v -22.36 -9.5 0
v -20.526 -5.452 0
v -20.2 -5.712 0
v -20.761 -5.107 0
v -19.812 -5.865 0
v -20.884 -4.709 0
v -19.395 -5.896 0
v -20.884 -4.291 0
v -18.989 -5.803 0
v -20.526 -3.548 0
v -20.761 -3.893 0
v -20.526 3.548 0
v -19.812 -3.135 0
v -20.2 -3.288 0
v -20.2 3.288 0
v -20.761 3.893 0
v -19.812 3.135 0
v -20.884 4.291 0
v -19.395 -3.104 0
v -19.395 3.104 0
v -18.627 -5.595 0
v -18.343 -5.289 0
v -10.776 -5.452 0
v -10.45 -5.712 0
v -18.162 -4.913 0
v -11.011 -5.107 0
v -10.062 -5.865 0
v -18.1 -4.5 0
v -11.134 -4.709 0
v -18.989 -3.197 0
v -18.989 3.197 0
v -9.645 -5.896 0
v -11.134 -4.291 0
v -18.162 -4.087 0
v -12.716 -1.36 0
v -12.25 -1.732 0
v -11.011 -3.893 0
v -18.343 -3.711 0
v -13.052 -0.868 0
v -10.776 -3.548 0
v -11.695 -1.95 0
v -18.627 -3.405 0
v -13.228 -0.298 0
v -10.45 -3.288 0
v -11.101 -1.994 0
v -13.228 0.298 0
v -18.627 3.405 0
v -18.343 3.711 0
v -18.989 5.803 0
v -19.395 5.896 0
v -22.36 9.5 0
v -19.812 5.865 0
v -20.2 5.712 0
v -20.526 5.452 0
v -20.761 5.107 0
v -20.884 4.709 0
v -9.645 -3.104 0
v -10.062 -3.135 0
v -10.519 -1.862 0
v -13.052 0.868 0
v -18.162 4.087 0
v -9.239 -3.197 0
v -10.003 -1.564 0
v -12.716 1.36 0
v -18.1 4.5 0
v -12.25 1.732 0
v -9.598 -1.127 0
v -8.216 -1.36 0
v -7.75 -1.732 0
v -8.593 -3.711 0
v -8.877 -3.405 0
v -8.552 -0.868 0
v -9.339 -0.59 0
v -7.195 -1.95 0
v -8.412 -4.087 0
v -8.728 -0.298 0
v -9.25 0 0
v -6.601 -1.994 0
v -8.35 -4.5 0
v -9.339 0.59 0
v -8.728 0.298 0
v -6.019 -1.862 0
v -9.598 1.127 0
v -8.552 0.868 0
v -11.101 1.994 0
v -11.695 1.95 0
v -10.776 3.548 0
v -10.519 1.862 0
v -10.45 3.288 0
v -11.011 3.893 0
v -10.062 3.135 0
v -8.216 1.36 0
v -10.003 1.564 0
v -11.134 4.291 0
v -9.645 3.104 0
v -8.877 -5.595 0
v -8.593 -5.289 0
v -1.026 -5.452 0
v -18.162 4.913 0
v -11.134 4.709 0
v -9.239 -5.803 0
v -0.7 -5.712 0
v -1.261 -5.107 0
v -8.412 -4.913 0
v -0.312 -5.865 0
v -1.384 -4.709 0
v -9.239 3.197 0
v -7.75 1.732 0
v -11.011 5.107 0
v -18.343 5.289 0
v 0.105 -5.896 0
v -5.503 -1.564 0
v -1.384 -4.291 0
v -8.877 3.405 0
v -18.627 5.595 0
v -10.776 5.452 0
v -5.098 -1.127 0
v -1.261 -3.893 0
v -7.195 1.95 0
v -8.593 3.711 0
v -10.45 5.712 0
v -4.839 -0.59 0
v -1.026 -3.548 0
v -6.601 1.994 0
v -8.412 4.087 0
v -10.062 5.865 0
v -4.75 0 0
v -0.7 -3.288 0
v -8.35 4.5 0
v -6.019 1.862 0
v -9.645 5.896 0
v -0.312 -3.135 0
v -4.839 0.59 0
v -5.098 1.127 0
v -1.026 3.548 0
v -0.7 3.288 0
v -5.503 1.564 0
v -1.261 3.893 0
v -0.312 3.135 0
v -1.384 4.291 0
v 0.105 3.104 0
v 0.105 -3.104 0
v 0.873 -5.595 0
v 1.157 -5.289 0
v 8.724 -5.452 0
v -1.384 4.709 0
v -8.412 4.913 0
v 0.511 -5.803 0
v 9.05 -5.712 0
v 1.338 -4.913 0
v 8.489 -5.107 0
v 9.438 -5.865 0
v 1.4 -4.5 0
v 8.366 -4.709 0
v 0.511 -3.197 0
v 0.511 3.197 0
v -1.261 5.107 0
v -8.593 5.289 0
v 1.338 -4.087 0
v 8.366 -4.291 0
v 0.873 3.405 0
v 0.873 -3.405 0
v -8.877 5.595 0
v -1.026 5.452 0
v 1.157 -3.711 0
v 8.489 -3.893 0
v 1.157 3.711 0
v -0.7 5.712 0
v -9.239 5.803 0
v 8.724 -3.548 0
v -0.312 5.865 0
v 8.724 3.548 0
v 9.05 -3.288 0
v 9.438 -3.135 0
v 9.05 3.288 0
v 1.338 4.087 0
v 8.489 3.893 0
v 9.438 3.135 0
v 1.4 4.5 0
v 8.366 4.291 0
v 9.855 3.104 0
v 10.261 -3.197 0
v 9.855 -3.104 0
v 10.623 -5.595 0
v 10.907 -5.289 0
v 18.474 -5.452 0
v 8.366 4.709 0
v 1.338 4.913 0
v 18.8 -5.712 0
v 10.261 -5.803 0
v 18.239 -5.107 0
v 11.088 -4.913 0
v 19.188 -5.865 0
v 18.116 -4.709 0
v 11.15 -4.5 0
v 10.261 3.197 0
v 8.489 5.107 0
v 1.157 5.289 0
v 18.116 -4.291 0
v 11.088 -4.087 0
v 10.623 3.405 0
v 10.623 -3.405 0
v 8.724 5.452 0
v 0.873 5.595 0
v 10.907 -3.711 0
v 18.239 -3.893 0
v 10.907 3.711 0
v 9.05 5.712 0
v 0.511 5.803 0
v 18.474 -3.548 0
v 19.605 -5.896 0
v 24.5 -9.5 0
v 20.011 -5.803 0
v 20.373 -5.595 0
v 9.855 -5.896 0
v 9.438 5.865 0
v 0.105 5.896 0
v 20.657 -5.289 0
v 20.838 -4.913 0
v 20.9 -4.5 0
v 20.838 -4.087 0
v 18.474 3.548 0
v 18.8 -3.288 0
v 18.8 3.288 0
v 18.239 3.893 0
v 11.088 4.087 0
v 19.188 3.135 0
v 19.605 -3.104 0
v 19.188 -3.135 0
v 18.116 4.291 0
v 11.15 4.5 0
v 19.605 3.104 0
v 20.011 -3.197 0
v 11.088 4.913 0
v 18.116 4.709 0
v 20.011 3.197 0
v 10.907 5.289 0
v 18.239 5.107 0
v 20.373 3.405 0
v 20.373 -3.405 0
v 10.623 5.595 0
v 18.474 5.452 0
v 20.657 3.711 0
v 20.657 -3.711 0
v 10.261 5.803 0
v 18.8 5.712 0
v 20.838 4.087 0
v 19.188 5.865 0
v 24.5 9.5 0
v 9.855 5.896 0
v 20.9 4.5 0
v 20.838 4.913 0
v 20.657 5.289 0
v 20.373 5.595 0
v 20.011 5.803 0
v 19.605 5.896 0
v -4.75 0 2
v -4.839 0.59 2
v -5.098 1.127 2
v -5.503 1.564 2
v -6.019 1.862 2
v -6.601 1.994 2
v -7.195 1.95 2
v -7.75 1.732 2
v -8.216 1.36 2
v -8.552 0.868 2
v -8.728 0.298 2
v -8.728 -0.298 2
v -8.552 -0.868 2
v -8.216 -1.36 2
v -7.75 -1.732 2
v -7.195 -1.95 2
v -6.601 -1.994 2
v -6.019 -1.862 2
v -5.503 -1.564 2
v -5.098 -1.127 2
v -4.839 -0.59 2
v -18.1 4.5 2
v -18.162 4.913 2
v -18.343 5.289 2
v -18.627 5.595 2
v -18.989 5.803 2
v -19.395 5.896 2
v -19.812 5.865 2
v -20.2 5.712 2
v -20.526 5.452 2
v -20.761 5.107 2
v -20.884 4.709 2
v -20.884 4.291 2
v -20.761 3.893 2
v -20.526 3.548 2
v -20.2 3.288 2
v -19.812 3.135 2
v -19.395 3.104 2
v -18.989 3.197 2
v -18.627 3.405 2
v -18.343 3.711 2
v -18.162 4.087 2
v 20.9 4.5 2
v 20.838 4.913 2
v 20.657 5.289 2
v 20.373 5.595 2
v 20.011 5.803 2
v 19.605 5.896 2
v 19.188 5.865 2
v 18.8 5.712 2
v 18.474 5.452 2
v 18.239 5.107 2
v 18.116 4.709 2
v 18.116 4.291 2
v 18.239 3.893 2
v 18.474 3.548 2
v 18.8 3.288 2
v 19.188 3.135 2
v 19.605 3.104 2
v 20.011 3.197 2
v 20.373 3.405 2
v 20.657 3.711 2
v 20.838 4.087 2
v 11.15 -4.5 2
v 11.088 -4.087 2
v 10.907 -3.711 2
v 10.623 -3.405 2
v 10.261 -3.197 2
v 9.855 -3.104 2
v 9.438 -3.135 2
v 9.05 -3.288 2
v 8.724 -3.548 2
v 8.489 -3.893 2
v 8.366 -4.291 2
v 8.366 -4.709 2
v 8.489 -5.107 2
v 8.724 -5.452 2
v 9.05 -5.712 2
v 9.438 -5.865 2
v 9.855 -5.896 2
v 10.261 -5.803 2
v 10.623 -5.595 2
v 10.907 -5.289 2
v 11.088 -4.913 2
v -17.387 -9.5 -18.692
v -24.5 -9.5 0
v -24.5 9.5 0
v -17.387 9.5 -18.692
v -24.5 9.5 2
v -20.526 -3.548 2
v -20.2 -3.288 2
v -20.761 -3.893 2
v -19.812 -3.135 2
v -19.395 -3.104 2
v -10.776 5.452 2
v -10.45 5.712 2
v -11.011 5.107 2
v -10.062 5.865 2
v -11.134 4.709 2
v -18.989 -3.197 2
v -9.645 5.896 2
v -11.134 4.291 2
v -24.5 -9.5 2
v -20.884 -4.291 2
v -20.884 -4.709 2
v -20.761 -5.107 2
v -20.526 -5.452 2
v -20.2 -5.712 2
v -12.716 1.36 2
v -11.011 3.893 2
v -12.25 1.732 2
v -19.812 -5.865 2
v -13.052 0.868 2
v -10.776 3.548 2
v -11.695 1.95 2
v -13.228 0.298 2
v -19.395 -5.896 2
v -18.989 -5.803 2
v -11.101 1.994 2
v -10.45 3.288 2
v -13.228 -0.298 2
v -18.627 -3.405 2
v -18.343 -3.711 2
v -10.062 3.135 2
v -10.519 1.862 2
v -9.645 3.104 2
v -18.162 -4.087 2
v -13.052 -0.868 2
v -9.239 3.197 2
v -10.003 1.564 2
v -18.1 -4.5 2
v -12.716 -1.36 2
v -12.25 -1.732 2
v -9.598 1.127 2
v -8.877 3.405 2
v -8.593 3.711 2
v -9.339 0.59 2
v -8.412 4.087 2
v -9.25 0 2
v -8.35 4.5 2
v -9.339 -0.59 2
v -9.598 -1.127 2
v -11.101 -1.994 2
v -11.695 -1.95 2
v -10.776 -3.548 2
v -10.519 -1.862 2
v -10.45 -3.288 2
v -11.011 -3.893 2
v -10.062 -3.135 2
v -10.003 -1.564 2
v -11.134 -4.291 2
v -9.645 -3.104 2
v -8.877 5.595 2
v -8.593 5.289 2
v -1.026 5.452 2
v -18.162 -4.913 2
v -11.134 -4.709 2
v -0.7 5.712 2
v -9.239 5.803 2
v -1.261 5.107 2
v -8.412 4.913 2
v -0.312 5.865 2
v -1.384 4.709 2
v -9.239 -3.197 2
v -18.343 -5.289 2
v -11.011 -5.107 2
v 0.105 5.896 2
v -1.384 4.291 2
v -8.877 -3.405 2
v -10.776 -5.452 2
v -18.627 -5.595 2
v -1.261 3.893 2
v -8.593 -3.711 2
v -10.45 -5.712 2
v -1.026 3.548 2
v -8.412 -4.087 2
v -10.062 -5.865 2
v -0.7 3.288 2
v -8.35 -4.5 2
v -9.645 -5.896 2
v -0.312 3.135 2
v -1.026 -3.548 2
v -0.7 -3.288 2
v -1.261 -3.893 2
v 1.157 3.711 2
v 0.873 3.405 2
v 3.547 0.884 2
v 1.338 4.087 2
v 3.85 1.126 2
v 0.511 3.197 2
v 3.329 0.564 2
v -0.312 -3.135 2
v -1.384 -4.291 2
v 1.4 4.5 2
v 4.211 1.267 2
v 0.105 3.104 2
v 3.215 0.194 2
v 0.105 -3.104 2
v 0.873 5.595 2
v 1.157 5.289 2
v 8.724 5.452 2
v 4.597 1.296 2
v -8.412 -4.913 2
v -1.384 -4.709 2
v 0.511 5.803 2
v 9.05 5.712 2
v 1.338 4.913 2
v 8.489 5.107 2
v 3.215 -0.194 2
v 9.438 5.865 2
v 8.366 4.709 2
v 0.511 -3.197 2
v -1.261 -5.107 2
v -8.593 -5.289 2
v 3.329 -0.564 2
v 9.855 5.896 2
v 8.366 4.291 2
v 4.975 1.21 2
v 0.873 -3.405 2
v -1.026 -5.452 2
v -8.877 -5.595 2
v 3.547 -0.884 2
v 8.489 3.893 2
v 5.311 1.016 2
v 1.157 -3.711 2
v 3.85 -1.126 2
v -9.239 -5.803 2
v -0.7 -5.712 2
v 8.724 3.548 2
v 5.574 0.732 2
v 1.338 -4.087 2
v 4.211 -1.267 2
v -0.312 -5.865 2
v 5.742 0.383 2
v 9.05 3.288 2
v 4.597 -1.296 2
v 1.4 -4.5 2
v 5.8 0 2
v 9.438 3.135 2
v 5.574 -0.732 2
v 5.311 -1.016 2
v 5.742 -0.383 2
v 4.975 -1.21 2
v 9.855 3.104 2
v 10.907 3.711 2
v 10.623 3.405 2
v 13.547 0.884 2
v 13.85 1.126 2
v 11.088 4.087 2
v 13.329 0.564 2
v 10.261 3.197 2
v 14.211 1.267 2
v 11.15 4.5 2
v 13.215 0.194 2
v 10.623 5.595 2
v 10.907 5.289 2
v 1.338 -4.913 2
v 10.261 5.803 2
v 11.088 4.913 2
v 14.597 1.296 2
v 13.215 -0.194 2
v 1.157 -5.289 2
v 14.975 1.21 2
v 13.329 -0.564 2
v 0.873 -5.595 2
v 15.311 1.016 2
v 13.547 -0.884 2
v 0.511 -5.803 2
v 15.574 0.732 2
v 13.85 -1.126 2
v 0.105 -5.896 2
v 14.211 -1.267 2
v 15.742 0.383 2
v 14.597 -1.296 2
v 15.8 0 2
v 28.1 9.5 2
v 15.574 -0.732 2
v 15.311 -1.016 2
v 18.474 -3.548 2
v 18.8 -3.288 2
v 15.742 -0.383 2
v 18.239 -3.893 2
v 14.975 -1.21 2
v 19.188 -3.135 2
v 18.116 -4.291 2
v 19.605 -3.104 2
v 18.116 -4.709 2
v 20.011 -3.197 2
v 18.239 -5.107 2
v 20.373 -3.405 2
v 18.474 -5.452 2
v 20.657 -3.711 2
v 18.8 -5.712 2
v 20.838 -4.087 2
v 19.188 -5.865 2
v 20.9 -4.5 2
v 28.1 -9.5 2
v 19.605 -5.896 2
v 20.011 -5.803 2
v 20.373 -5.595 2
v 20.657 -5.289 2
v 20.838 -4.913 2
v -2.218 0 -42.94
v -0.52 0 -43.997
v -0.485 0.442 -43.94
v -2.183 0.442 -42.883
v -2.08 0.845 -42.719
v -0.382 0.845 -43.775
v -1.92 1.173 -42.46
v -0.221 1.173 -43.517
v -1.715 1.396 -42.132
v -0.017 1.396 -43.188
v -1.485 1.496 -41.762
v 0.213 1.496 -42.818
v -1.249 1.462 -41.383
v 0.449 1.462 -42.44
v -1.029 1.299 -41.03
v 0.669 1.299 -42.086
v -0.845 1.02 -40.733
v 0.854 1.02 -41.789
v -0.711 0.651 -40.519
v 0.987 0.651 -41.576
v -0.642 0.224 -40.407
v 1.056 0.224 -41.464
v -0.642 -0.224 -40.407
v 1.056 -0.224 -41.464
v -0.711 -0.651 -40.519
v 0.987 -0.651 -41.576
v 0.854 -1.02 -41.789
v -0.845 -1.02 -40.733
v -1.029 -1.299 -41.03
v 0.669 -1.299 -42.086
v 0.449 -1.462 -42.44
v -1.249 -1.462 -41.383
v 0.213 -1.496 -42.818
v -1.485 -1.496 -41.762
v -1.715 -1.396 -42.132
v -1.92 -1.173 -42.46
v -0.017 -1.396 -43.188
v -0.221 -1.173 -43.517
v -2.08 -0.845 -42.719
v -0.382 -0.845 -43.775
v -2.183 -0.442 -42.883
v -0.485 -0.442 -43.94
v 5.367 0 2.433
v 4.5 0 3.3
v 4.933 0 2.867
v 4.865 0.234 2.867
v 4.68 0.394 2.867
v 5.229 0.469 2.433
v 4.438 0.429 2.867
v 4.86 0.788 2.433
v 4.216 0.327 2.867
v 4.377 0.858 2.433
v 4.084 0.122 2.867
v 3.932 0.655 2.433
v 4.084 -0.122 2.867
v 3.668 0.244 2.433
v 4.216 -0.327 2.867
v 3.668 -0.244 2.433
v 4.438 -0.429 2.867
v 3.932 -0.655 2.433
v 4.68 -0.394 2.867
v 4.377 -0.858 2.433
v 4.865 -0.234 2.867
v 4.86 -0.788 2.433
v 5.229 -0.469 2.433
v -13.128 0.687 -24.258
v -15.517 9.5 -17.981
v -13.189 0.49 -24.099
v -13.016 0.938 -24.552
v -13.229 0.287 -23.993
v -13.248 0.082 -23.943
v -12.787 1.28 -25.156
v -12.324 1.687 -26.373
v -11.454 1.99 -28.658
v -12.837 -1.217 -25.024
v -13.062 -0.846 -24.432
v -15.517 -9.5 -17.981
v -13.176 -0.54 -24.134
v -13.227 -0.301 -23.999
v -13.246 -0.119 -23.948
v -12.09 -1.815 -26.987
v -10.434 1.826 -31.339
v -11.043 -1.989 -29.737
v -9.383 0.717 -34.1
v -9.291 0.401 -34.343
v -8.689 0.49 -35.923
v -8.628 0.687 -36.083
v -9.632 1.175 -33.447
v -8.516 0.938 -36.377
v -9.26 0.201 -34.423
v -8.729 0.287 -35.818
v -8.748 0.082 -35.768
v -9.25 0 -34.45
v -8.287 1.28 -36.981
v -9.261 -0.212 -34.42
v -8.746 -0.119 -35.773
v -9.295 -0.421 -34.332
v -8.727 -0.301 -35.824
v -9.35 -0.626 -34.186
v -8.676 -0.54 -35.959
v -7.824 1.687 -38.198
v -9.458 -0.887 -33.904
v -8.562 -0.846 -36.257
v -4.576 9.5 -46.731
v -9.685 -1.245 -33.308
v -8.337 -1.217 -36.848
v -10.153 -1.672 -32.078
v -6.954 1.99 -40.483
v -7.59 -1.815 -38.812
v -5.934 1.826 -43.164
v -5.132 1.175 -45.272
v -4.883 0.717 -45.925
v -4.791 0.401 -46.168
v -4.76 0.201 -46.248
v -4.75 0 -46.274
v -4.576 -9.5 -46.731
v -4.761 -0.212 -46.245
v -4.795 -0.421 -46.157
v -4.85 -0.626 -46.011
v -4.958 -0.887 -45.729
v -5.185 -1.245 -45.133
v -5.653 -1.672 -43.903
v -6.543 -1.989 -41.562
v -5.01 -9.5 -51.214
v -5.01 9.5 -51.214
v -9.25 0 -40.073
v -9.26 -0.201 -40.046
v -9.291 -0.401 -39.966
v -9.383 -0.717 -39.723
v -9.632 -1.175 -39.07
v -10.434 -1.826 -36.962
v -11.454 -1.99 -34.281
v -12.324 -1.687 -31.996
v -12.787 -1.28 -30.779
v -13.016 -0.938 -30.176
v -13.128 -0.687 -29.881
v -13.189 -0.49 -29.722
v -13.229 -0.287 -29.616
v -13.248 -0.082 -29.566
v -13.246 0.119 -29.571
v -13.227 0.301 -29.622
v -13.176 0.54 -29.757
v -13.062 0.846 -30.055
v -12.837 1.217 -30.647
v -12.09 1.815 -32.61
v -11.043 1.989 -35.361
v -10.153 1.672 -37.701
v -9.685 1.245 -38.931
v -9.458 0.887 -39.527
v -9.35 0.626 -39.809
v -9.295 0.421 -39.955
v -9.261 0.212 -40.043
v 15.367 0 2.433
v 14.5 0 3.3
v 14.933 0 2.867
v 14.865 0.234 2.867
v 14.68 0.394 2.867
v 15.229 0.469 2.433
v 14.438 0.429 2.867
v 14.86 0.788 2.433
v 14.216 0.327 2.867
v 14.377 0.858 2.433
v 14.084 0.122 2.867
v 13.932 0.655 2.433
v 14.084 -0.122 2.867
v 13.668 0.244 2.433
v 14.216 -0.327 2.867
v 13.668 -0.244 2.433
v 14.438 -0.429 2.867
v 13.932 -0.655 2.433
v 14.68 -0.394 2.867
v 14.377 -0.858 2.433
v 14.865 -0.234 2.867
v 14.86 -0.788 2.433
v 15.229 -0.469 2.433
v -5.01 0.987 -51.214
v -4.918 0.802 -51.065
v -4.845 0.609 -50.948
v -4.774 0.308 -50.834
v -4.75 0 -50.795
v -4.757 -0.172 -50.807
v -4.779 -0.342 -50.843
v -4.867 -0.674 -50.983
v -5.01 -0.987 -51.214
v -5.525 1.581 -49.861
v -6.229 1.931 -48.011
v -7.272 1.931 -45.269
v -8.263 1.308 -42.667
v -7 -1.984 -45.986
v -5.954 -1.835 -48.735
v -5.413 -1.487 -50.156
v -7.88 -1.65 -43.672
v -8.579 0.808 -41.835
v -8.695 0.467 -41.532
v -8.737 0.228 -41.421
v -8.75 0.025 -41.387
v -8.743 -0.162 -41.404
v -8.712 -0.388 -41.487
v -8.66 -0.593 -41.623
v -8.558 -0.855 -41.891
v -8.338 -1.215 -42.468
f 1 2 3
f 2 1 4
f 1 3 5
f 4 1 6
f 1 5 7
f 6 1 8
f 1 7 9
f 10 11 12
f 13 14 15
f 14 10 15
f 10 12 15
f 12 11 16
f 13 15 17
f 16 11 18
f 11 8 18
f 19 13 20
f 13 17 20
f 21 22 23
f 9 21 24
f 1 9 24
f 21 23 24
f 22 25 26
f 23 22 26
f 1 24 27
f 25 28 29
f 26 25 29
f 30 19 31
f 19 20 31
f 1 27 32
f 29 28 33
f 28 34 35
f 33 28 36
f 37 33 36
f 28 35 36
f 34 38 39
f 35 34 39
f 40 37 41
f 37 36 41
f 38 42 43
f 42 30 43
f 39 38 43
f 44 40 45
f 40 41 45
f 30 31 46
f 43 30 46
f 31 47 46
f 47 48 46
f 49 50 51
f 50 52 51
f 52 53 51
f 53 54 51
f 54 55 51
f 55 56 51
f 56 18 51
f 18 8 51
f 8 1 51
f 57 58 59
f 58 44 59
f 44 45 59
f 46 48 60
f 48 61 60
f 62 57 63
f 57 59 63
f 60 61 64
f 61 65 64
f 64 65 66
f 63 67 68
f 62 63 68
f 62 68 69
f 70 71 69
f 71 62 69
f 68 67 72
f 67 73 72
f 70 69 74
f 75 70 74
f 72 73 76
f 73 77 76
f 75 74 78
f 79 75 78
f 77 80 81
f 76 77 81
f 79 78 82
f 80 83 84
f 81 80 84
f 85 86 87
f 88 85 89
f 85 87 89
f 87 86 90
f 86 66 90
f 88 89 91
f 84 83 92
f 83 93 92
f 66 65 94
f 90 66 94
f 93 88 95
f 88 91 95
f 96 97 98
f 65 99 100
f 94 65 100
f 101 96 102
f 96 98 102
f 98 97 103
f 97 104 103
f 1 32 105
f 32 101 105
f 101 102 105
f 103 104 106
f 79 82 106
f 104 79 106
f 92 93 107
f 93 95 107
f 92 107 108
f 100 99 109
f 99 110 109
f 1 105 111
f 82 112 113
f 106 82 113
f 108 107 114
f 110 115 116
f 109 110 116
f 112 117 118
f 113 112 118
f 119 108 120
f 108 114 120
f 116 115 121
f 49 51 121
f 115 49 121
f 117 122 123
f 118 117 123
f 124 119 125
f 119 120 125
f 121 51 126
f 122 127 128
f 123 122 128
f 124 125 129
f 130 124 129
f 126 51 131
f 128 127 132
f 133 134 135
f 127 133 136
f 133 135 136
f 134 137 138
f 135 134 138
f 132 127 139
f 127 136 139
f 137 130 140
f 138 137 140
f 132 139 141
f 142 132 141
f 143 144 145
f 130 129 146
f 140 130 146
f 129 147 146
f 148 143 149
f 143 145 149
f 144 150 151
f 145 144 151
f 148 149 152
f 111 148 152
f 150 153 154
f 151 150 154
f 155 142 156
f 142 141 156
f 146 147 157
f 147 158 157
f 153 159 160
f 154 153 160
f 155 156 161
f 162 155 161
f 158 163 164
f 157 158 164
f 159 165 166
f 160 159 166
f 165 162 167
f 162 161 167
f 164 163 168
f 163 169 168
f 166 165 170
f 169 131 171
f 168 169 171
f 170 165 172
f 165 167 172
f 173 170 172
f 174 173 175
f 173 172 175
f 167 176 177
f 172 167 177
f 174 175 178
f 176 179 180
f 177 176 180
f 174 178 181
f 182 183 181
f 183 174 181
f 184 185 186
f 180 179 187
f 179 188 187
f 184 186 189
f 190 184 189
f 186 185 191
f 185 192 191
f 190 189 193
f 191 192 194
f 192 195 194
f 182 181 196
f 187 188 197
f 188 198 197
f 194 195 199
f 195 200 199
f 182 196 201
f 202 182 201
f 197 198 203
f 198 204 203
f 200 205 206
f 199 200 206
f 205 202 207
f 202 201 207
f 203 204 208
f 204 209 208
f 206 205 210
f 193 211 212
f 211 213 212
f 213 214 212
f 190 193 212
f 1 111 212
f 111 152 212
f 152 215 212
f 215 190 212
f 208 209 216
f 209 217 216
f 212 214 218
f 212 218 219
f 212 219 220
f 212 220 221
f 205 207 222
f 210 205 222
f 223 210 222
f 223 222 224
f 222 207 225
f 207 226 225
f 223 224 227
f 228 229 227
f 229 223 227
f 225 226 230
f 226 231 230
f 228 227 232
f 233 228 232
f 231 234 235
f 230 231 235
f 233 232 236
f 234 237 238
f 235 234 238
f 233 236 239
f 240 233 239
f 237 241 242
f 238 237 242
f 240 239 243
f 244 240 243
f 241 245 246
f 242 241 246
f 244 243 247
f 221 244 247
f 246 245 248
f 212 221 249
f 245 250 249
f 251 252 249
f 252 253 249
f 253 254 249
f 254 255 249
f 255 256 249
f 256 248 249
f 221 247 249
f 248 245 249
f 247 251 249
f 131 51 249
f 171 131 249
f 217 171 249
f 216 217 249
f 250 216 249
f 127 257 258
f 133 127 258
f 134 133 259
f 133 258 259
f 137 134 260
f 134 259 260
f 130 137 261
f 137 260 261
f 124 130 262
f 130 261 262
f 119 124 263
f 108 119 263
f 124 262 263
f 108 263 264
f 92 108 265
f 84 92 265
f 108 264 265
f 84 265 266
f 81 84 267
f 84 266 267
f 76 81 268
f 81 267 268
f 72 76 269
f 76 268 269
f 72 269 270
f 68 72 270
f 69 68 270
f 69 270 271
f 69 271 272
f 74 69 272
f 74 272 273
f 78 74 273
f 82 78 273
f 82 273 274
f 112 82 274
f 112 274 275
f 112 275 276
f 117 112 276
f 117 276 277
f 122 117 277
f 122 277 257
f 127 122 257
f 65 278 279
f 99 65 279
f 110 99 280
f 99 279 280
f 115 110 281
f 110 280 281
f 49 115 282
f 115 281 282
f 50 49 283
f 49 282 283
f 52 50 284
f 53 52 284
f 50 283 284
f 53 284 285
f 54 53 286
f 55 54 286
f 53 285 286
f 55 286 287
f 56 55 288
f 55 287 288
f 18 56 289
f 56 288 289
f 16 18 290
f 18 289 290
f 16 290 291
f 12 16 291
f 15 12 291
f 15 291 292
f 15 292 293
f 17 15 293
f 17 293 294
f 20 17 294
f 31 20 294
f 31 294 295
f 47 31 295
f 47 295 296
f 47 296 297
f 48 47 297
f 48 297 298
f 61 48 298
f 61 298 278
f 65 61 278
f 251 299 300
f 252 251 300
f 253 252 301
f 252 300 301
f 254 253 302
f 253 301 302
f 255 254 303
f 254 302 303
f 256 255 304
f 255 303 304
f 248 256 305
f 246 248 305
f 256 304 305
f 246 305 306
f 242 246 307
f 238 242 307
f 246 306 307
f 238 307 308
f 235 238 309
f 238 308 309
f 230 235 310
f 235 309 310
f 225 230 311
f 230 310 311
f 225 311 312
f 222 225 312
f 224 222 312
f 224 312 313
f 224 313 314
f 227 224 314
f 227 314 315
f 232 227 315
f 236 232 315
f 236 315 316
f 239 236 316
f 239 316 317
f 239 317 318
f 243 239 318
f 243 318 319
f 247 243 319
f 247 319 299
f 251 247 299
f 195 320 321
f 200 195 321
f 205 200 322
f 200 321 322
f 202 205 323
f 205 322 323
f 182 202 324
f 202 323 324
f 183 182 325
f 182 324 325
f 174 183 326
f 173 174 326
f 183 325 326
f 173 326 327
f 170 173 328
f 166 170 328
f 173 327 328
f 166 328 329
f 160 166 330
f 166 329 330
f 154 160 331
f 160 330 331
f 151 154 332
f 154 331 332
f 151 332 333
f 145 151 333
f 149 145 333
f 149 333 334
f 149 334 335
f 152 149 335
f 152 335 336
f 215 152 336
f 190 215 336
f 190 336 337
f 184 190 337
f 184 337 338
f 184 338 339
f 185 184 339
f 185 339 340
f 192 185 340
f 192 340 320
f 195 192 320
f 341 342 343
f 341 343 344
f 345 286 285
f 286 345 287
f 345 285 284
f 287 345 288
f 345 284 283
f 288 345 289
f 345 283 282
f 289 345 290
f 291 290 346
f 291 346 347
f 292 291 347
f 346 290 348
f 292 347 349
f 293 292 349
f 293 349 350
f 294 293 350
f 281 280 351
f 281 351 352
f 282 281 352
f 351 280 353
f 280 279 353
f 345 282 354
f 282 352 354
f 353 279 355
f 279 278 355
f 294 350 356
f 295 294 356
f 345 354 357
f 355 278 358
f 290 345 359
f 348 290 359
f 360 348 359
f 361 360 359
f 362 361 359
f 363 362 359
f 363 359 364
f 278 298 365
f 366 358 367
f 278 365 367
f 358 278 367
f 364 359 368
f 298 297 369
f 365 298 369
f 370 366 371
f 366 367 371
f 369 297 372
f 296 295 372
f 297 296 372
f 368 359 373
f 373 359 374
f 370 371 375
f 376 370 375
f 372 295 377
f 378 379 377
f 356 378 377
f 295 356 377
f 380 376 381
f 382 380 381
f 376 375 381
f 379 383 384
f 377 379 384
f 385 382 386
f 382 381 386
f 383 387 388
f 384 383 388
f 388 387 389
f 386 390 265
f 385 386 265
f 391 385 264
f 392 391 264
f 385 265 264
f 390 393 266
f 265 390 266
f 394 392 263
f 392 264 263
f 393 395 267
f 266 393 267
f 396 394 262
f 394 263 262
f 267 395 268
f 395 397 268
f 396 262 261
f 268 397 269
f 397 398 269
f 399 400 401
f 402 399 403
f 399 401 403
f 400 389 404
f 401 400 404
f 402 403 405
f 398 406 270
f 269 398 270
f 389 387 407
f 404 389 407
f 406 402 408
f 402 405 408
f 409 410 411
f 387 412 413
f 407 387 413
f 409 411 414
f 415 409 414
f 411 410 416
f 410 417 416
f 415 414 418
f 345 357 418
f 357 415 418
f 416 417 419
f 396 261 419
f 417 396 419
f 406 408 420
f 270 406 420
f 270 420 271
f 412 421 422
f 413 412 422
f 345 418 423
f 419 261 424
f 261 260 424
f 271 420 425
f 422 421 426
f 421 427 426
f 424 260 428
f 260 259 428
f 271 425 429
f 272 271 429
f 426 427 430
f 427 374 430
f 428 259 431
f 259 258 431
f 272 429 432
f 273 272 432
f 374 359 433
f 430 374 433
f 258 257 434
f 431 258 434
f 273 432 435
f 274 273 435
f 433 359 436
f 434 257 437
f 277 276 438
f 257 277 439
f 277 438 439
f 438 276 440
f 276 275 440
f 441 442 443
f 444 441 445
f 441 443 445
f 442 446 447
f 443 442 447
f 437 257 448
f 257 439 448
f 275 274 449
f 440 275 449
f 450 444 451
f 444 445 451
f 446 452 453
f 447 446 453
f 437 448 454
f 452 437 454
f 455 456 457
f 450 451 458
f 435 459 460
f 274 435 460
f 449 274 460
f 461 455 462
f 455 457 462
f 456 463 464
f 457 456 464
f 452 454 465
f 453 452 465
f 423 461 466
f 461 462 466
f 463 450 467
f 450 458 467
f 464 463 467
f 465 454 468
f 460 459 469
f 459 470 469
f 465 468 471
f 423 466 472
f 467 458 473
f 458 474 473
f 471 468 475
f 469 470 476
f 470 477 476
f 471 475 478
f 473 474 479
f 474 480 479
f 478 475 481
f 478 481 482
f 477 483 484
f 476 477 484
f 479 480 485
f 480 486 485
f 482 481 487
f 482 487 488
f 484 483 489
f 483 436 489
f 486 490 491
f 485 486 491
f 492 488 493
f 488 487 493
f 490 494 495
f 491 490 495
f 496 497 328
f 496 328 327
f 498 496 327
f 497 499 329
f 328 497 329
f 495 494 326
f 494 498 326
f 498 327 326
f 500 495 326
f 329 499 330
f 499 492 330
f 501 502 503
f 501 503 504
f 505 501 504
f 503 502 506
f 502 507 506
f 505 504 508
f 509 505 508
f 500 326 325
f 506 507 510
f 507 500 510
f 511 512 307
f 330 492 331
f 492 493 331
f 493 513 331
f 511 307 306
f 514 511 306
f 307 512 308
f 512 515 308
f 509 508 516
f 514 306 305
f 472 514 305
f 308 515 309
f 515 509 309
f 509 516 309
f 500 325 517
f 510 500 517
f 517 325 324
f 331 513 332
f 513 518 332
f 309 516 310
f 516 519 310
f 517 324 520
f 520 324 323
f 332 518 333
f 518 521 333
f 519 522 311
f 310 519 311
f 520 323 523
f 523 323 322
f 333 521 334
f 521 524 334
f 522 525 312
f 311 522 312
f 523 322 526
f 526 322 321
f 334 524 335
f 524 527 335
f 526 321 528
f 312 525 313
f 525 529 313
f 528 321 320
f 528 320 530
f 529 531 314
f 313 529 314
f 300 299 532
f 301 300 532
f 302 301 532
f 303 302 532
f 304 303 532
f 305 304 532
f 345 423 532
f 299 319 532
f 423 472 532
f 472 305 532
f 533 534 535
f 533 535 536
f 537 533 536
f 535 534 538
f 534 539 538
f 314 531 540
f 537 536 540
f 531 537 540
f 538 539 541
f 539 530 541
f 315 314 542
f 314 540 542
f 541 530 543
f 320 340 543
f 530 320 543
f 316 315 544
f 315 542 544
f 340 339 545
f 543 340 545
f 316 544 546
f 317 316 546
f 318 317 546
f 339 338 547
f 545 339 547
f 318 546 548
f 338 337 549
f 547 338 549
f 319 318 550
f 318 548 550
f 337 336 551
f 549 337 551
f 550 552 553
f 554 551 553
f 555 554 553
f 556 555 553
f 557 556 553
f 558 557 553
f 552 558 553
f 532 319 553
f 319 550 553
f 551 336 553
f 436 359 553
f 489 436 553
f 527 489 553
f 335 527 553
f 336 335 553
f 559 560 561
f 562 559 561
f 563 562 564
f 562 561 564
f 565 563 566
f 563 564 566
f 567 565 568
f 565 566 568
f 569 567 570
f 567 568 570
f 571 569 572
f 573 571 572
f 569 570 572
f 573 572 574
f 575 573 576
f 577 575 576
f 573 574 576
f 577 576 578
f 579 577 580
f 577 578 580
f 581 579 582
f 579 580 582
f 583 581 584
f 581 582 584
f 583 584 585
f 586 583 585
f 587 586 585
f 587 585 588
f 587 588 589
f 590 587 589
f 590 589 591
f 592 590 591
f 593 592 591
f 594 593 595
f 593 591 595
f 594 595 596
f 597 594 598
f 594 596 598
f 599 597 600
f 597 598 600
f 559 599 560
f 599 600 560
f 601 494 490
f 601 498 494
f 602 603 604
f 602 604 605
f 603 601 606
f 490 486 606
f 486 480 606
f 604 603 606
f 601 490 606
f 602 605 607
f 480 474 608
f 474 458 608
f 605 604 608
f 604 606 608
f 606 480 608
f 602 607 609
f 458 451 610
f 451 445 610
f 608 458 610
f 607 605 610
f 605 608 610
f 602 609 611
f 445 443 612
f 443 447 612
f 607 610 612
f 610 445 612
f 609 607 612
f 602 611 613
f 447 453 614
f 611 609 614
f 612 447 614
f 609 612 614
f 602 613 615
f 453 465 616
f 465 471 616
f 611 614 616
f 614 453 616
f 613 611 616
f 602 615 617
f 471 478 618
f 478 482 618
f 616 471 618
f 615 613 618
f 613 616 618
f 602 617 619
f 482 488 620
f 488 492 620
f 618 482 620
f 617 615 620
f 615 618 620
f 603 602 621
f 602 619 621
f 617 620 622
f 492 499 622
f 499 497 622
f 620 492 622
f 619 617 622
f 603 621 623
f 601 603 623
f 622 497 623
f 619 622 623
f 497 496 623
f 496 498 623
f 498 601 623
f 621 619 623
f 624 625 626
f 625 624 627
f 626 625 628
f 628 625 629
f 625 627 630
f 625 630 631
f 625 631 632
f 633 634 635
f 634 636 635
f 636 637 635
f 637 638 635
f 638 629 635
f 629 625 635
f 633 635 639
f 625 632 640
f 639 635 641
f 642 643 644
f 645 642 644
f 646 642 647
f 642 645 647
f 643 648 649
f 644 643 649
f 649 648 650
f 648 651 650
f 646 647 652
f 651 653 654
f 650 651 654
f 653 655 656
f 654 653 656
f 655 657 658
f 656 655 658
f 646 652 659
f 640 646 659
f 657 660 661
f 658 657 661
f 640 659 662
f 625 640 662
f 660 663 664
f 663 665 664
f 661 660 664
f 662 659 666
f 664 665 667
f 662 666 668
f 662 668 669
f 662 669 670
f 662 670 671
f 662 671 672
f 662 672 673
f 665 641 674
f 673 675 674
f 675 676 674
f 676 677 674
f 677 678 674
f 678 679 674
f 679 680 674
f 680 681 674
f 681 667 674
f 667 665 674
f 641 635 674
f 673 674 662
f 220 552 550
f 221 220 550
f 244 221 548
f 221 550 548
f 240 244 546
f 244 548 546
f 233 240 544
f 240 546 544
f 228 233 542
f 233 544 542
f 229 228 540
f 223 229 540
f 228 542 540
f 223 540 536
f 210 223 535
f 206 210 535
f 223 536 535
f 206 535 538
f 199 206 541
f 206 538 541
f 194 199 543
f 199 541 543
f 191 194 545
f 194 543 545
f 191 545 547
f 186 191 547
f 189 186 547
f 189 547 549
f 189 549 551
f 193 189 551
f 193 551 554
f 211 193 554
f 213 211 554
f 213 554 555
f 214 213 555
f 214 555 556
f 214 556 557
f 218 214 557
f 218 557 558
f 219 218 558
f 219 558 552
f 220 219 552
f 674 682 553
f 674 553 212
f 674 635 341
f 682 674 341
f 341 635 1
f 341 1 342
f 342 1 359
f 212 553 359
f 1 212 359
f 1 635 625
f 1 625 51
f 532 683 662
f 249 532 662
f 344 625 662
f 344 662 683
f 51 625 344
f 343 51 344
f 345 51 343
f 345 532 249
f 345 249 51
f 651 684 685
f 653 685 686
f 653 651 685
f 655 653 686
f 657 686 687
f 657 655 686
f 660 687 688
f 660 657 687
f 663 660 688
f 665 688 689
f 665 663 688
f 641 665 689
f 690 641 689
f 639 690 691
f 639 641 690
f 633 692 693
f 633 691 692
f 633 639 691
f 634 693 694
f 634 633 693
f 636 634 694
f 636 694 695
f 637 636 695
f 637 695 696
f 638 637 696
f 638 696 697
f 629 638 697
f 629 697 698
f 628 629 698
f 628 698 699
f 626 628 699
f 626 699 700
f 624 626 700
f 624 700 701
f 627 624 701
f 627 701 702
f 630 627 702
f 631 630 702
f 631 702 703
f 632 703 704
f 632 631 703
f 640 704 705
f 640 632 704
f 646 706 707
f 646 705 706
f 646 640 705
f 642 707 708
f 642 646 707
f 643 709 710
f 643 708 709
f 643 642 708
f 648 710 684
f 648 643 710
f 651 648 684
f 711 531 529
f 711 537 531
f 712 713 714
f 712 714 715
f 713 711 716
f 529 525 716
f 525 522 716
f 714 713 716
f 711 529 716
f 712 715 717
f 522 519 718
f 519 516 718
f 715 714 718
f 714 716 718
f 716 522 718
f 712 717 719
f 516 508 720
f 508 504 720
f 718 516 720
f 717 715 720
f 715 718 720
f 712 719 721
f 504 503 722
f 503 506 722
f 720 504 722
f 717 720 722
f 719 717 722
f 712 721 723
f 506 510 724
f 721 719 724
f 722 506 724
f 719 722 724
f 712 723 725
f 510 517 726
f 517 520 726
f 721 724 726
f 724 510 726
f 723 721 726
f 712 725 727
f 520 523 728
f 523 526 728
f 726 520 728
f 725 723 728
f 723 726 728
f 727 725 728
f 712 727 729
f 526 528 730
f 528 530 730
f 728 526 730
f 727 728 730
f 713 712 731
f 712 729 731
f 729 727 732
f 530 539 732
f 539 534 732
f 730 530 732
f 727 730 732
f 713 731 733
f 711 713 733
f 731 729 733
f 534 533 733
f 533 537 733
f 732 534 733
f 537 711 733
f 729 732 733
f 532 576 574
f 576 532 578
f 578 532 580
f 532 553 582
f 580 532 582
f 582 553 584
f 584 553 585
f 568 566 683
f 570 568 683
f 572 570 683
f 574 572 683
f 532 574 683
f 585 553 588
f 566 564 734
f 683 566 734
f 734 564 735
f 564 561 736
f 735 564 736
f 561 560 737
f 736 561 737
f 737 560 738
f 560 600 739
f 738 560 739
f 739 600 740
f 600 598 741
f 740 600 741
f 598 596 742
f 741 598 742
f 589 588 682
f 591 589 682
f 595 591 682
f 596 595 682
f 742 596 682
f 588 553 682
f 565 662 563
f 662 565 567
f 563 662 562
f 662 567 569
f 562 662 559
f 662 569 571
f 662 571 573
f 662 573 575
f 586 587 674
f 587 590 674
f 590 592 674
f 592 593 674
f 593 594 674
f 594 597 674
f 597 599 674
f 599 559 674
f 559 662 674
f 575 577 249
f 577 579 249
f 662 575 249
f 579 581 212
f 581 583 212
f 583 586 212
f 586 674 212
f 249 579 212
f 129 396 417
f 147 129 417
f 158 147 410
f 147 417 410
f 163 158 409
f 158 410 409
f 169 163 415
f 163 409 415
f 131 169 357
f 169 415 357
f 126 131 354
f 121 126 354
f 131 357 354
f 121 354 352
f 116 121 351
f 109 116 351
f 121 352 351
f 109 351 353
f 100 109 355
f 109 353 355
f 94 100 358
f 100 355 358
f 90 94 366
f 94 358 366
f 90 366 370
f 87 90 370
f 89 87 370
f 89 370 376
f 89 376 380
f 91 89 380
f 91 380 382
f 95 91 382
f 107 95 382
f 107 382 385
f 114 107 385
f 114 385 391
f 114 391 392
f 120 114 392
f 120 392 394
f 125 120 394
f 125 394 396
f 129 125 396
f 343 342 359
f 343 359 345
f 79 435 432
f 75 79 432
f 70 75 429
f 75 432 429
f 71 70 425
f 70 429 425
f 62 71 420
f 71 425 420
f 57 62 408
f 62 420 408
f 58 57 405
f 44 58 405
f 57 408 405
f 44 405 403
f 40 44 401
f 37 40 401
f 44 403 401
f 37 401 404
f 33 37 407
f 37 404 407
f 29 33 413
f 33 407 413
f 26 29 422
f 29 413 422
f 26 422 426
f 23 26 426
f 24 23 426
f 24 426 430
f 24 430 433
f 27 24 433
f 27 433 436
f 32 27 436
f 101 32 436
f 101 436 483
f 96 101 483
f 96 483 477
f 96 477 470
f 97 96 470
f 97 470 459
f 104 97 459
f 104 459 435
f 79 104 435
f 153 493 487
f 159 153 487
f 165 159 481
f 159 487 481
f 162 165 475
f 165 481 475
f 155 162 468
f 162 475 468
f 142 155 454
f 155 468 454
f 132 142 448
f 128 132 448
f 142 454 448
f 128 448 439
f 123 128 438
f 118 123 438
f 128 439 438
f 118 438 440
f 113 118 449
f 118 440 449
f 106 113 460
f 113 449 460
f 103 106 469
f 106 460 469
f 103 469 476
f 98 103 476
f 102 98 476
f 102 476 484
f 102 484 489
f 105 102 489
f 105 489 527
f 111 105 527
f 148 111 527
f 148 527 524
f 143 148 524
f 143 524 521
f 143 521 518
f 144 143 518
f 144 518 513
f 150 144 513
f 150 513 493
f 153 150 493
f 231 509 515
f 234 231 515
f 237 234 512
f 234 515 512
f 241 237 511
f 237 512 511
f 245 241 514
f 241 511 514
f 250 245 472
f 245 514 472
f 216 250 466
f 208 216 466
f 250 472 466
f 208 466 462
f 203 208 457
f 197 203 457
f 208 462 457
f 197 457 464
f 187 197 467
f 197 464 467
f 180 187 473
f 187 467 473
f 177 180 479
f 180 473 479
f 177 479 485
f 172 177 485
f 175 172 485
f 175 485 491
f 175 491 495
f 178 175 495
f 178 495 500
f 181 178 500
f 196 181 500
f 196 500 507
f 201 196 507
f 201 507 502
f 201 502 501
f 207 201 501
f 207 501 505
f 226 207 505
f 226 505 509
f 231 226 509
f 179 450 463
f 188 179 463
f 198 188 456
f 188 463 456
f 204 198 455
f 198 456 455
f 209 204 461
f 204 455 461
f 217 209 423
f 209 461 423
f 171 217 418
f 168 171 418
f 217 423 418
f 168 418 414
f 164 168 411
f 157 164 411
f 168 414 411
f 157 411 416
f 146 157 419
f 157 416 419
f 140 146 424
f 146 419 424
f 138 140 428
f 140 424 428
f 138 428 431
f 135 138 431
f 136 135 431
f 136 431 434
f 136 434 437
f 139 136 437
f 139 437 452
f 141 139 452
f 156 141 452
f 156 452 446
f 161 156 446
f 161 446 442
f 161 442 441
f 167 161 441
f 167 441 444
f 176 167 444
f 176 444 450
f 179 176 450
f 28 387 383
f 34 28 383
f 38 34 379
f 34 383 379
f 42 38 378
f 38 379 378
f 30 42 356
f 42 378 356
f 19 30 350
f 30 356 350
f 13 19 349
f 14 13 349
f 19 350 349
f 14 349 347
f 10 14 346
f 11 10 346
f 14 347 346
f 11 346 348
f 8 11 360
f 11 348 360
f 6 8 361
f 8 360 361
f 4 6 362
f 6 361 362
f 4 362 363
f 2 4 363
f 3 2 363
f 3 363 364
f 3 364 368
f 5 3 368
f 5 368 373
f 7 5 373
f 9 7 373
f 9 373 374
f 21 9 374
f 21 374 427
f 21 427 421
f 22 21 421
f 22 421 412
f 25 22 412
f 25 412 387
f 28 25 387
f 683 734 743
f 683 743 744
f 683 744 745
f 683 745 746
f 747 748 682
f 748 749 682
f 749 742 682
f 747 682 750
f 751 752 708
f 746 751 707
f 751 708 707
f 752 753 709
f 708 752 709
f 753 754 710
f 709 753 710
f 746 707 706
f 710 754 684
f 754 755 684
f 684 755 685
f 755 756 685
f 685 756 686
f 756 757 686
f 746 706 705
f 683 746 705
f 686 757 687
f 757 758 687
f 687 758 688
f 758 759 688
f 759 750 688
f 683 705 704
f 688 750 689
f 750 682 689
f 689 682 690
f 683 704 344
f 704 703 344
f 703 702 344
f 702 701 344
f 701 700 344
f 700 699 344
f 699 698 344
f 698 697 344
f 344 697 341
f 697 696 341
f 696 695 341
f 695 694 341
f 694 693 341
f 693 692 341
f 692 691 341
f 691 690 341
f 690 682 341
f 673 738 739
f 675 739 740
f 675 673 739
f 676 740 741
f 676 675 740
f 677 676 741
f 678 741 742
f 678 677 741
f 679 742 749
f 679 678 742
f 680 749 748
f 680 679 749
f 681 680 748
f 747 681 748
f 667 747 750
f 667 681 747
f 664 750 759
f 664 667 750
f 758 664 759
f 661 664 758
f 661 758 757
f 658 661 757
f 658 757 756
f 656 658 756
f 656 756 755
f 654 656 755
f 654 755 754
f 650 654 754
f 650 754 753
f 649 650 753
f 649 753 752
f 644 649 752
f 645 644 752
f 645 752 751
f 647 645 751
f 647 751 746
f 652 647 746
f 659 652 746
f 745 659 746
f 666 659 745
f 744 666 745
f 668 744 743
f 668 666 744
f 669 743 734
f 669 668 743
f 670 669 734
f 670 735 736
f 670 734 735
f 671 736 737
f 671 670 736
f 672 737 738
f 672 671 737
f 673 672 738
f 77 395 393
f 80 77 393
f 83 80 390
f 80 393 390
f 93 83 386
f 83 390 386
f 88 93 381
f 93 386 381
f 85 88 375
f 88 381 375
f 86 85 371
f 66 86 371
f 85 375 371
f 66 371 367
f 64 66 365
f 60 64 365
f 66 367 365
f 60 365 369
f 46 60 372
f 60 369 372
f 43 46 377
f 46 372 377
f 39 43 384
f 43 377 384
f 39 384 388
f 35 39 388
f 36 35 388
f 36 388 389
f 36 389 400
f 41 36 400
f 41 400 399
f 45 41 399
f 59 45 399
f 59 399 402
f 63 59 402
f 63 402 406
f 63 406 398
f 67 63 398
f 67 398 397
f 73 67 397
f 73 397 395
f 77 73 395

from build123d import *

# Parameters (mm, degrees)
SKETCH1_W           = 49
SKETCH1_H           = 19
BOSS_EXTRUDE1_DEPTH = 2
SKETCH3_R           = 1.4
CUT_EXTRUDE1_DEPTH  = 27.353367906
SKETCH5_R           = 2
CUT_EXTRUDE2_DEPTH  = 10
SKETCH2_R           = 1.3
BOSS_EXTRUDE2_DEPTH = 2.5
BOSS_EXTRUDE3_DEPTH = 19
BOSS_EXTRUDE4_DEPTH = 19
SKETCH7_R           = 2
CUT_EXTRUDE3_DEPTH  = 60.183519481
SKETCH8_R           = 1.5
CUT_EXTRUDE4_DEPTH  = 2


# Read off the part's stored shape, not the designer's step: Draft1
with BuildPart() as part:
    # Sketch1 → Boss-Extrude1 (new body)
    with BuildSketch(Plane.XY):
        Rectangle(SKETCH1_W, SKETCH1_H)
    extrude(amount=BOSS_EXTRUDE1_DEPTH)

    # Sketch3 → Cut-Extrude1 (cut, through all)
    with BuildSketch(Plane.XY.offset(2)):
        with Locations((19.5, 4.5)):
            Circle(SKETCH3_R)
        with Locations((9.75, 4.5)):
            Circle(SKETCH3_R)
        with Locations((0, 4.5)):
            Circle(SKETCH3_R)
        with Locations((-9.75, 4.5)):
            Circle(SKETCH3_R)
        with Locations((-19.5, 4.5)):
            Circle(SKETCH3_R)
        with Locations((-19.5, -4.5)):
            Circle(SKETCH3_R)
        with Locations((-9.75, -4.5)):
            Circle(SKETCH3_R)
        with Locations((0, -4.5)):
            Circle(SKETCH3_R)
        with Locations((9.75, -4.5)):
            Circle(SKETCH3_R)
        with Locations((19.5, -4.5)):
            Circle(SKETCH3_R)
    extrude(amount=-CUT_EXTRUDE1_DEPTH, mode=Mode.SUBTRACT)

    # Sketch5 → Cut-Extrude2 (cut)
    with BuildSketch(Plane.XY.offset(2)):
        with Locations((-6.75, 0)):
            Circle(SKETCH5_R)
        with Locations((-11.25, 0)):
            Circle(SKETCH5_R)
    extrude(amount=-CUT_EXTRUDE2_DEPTH, mode=Mode.SUBTRACT)

    # Sketch2 → Boss-Extrude2 (add)
    with BuildSketch(Plane.XY.offset(2)):
        with Locations((4.5, 0)):
            Circle(SKETCH2_R)
        with Locations((14.5, 0)):
            Circle(SKETCH2_R)
    extrude(amount=BOSS_EXTRUDE2_DEPTH)

    # Draft1 outline → Draft1 (revolve, cut)
    with BuildSketch(Plane(origin=(4.5, 0, 0), x_dir=(1, 0, 0), z_dir=(0, -1, 0))):
        Polygon((1.3, 2), (1.3, 4.5), (0, 4.5), (0, 3.3), align=None)
    revolve(axis=Axis((4.5, 0, 0), (0, 0, 1)), mode=Mode.SUBTRACT)

    # Draft1 2 outline → Draft1 2 (revolve, cut)
    with BuildSketch(Plane(origin=(14.5, 0, 0), x_dir=(1, 0, 0), z_dir=(0, -1, 0))):
        Polygon((1.3, 2), (1.3, 4.5), (0, 4.5), (0, 3.3), align=None)
    revolve(axis=Axis((14.5, 0, 0), (0, 0, 1)), mode=Mode.SUBTRACT)

    # Sketch4 → Boss-Extrude3 (add)
    with BuildSketch(Plane.XZ.offset(9.5)):
        Polygon((-24.5, 0), (-17.386542933, -18.692210371), (-15.517321896, -17.980864664), (-22.360071163, 0), align=None)
    extrude(amount=-BOSS_EXTRUDE3_DEPTH)

    # Sketch6 → Boss-Extrude4 (add)
    with BuildSketch(Plane.XZ.offset(9.5)):
        Polygon((-15.517321896, -17.980864664), (-4.576428495, -46.730525927), (24.5, 0), (24.5, 2), (28.099977552, 2), (-5.010300383, -51.213574761), (-17.386542933, -18.692210371), align=None)
    extrude(amount=-BOSS_EXTRUDE4_DEPTH)

    # Sketch7 → Cut-Extrude3 (cut, through all)
    with BuildSketch(Plane(origin=(0, 0, 0), x_dir=(-1, 0, 0), z_dir=(0, 0, -1))):
        with Locations(Location((11.25, 0, 0), (0, 0, 180))):
            Circle(SKETCH7_R)
        with Locations(Location((6.75, 0, 0), (0, 0, 180))):
            Circle(SKETCH7_R)
    extrude(amount=CUT_EXTRUDE3_DEPTH, mode=Mode.SUBTRACT)

    # Sketch8 → Cut-Extrude4 (cut)
    with BuildSketch(Plane(origin=(19.36021452, 0, -12.046213518), x_dir=(-0.5282973915815173, 0, -0.849059400777216), z_dir=(0.8490594007772159, 0, -0.5282973915815172))):
        with Locations((36.130295721, 0)):
            Circle(SKETCH8_R)
    extrude(amount=-CUT_EXTRUDE4_DEPTH, mode=Mode.SUBTRACT)


solid = part.part
